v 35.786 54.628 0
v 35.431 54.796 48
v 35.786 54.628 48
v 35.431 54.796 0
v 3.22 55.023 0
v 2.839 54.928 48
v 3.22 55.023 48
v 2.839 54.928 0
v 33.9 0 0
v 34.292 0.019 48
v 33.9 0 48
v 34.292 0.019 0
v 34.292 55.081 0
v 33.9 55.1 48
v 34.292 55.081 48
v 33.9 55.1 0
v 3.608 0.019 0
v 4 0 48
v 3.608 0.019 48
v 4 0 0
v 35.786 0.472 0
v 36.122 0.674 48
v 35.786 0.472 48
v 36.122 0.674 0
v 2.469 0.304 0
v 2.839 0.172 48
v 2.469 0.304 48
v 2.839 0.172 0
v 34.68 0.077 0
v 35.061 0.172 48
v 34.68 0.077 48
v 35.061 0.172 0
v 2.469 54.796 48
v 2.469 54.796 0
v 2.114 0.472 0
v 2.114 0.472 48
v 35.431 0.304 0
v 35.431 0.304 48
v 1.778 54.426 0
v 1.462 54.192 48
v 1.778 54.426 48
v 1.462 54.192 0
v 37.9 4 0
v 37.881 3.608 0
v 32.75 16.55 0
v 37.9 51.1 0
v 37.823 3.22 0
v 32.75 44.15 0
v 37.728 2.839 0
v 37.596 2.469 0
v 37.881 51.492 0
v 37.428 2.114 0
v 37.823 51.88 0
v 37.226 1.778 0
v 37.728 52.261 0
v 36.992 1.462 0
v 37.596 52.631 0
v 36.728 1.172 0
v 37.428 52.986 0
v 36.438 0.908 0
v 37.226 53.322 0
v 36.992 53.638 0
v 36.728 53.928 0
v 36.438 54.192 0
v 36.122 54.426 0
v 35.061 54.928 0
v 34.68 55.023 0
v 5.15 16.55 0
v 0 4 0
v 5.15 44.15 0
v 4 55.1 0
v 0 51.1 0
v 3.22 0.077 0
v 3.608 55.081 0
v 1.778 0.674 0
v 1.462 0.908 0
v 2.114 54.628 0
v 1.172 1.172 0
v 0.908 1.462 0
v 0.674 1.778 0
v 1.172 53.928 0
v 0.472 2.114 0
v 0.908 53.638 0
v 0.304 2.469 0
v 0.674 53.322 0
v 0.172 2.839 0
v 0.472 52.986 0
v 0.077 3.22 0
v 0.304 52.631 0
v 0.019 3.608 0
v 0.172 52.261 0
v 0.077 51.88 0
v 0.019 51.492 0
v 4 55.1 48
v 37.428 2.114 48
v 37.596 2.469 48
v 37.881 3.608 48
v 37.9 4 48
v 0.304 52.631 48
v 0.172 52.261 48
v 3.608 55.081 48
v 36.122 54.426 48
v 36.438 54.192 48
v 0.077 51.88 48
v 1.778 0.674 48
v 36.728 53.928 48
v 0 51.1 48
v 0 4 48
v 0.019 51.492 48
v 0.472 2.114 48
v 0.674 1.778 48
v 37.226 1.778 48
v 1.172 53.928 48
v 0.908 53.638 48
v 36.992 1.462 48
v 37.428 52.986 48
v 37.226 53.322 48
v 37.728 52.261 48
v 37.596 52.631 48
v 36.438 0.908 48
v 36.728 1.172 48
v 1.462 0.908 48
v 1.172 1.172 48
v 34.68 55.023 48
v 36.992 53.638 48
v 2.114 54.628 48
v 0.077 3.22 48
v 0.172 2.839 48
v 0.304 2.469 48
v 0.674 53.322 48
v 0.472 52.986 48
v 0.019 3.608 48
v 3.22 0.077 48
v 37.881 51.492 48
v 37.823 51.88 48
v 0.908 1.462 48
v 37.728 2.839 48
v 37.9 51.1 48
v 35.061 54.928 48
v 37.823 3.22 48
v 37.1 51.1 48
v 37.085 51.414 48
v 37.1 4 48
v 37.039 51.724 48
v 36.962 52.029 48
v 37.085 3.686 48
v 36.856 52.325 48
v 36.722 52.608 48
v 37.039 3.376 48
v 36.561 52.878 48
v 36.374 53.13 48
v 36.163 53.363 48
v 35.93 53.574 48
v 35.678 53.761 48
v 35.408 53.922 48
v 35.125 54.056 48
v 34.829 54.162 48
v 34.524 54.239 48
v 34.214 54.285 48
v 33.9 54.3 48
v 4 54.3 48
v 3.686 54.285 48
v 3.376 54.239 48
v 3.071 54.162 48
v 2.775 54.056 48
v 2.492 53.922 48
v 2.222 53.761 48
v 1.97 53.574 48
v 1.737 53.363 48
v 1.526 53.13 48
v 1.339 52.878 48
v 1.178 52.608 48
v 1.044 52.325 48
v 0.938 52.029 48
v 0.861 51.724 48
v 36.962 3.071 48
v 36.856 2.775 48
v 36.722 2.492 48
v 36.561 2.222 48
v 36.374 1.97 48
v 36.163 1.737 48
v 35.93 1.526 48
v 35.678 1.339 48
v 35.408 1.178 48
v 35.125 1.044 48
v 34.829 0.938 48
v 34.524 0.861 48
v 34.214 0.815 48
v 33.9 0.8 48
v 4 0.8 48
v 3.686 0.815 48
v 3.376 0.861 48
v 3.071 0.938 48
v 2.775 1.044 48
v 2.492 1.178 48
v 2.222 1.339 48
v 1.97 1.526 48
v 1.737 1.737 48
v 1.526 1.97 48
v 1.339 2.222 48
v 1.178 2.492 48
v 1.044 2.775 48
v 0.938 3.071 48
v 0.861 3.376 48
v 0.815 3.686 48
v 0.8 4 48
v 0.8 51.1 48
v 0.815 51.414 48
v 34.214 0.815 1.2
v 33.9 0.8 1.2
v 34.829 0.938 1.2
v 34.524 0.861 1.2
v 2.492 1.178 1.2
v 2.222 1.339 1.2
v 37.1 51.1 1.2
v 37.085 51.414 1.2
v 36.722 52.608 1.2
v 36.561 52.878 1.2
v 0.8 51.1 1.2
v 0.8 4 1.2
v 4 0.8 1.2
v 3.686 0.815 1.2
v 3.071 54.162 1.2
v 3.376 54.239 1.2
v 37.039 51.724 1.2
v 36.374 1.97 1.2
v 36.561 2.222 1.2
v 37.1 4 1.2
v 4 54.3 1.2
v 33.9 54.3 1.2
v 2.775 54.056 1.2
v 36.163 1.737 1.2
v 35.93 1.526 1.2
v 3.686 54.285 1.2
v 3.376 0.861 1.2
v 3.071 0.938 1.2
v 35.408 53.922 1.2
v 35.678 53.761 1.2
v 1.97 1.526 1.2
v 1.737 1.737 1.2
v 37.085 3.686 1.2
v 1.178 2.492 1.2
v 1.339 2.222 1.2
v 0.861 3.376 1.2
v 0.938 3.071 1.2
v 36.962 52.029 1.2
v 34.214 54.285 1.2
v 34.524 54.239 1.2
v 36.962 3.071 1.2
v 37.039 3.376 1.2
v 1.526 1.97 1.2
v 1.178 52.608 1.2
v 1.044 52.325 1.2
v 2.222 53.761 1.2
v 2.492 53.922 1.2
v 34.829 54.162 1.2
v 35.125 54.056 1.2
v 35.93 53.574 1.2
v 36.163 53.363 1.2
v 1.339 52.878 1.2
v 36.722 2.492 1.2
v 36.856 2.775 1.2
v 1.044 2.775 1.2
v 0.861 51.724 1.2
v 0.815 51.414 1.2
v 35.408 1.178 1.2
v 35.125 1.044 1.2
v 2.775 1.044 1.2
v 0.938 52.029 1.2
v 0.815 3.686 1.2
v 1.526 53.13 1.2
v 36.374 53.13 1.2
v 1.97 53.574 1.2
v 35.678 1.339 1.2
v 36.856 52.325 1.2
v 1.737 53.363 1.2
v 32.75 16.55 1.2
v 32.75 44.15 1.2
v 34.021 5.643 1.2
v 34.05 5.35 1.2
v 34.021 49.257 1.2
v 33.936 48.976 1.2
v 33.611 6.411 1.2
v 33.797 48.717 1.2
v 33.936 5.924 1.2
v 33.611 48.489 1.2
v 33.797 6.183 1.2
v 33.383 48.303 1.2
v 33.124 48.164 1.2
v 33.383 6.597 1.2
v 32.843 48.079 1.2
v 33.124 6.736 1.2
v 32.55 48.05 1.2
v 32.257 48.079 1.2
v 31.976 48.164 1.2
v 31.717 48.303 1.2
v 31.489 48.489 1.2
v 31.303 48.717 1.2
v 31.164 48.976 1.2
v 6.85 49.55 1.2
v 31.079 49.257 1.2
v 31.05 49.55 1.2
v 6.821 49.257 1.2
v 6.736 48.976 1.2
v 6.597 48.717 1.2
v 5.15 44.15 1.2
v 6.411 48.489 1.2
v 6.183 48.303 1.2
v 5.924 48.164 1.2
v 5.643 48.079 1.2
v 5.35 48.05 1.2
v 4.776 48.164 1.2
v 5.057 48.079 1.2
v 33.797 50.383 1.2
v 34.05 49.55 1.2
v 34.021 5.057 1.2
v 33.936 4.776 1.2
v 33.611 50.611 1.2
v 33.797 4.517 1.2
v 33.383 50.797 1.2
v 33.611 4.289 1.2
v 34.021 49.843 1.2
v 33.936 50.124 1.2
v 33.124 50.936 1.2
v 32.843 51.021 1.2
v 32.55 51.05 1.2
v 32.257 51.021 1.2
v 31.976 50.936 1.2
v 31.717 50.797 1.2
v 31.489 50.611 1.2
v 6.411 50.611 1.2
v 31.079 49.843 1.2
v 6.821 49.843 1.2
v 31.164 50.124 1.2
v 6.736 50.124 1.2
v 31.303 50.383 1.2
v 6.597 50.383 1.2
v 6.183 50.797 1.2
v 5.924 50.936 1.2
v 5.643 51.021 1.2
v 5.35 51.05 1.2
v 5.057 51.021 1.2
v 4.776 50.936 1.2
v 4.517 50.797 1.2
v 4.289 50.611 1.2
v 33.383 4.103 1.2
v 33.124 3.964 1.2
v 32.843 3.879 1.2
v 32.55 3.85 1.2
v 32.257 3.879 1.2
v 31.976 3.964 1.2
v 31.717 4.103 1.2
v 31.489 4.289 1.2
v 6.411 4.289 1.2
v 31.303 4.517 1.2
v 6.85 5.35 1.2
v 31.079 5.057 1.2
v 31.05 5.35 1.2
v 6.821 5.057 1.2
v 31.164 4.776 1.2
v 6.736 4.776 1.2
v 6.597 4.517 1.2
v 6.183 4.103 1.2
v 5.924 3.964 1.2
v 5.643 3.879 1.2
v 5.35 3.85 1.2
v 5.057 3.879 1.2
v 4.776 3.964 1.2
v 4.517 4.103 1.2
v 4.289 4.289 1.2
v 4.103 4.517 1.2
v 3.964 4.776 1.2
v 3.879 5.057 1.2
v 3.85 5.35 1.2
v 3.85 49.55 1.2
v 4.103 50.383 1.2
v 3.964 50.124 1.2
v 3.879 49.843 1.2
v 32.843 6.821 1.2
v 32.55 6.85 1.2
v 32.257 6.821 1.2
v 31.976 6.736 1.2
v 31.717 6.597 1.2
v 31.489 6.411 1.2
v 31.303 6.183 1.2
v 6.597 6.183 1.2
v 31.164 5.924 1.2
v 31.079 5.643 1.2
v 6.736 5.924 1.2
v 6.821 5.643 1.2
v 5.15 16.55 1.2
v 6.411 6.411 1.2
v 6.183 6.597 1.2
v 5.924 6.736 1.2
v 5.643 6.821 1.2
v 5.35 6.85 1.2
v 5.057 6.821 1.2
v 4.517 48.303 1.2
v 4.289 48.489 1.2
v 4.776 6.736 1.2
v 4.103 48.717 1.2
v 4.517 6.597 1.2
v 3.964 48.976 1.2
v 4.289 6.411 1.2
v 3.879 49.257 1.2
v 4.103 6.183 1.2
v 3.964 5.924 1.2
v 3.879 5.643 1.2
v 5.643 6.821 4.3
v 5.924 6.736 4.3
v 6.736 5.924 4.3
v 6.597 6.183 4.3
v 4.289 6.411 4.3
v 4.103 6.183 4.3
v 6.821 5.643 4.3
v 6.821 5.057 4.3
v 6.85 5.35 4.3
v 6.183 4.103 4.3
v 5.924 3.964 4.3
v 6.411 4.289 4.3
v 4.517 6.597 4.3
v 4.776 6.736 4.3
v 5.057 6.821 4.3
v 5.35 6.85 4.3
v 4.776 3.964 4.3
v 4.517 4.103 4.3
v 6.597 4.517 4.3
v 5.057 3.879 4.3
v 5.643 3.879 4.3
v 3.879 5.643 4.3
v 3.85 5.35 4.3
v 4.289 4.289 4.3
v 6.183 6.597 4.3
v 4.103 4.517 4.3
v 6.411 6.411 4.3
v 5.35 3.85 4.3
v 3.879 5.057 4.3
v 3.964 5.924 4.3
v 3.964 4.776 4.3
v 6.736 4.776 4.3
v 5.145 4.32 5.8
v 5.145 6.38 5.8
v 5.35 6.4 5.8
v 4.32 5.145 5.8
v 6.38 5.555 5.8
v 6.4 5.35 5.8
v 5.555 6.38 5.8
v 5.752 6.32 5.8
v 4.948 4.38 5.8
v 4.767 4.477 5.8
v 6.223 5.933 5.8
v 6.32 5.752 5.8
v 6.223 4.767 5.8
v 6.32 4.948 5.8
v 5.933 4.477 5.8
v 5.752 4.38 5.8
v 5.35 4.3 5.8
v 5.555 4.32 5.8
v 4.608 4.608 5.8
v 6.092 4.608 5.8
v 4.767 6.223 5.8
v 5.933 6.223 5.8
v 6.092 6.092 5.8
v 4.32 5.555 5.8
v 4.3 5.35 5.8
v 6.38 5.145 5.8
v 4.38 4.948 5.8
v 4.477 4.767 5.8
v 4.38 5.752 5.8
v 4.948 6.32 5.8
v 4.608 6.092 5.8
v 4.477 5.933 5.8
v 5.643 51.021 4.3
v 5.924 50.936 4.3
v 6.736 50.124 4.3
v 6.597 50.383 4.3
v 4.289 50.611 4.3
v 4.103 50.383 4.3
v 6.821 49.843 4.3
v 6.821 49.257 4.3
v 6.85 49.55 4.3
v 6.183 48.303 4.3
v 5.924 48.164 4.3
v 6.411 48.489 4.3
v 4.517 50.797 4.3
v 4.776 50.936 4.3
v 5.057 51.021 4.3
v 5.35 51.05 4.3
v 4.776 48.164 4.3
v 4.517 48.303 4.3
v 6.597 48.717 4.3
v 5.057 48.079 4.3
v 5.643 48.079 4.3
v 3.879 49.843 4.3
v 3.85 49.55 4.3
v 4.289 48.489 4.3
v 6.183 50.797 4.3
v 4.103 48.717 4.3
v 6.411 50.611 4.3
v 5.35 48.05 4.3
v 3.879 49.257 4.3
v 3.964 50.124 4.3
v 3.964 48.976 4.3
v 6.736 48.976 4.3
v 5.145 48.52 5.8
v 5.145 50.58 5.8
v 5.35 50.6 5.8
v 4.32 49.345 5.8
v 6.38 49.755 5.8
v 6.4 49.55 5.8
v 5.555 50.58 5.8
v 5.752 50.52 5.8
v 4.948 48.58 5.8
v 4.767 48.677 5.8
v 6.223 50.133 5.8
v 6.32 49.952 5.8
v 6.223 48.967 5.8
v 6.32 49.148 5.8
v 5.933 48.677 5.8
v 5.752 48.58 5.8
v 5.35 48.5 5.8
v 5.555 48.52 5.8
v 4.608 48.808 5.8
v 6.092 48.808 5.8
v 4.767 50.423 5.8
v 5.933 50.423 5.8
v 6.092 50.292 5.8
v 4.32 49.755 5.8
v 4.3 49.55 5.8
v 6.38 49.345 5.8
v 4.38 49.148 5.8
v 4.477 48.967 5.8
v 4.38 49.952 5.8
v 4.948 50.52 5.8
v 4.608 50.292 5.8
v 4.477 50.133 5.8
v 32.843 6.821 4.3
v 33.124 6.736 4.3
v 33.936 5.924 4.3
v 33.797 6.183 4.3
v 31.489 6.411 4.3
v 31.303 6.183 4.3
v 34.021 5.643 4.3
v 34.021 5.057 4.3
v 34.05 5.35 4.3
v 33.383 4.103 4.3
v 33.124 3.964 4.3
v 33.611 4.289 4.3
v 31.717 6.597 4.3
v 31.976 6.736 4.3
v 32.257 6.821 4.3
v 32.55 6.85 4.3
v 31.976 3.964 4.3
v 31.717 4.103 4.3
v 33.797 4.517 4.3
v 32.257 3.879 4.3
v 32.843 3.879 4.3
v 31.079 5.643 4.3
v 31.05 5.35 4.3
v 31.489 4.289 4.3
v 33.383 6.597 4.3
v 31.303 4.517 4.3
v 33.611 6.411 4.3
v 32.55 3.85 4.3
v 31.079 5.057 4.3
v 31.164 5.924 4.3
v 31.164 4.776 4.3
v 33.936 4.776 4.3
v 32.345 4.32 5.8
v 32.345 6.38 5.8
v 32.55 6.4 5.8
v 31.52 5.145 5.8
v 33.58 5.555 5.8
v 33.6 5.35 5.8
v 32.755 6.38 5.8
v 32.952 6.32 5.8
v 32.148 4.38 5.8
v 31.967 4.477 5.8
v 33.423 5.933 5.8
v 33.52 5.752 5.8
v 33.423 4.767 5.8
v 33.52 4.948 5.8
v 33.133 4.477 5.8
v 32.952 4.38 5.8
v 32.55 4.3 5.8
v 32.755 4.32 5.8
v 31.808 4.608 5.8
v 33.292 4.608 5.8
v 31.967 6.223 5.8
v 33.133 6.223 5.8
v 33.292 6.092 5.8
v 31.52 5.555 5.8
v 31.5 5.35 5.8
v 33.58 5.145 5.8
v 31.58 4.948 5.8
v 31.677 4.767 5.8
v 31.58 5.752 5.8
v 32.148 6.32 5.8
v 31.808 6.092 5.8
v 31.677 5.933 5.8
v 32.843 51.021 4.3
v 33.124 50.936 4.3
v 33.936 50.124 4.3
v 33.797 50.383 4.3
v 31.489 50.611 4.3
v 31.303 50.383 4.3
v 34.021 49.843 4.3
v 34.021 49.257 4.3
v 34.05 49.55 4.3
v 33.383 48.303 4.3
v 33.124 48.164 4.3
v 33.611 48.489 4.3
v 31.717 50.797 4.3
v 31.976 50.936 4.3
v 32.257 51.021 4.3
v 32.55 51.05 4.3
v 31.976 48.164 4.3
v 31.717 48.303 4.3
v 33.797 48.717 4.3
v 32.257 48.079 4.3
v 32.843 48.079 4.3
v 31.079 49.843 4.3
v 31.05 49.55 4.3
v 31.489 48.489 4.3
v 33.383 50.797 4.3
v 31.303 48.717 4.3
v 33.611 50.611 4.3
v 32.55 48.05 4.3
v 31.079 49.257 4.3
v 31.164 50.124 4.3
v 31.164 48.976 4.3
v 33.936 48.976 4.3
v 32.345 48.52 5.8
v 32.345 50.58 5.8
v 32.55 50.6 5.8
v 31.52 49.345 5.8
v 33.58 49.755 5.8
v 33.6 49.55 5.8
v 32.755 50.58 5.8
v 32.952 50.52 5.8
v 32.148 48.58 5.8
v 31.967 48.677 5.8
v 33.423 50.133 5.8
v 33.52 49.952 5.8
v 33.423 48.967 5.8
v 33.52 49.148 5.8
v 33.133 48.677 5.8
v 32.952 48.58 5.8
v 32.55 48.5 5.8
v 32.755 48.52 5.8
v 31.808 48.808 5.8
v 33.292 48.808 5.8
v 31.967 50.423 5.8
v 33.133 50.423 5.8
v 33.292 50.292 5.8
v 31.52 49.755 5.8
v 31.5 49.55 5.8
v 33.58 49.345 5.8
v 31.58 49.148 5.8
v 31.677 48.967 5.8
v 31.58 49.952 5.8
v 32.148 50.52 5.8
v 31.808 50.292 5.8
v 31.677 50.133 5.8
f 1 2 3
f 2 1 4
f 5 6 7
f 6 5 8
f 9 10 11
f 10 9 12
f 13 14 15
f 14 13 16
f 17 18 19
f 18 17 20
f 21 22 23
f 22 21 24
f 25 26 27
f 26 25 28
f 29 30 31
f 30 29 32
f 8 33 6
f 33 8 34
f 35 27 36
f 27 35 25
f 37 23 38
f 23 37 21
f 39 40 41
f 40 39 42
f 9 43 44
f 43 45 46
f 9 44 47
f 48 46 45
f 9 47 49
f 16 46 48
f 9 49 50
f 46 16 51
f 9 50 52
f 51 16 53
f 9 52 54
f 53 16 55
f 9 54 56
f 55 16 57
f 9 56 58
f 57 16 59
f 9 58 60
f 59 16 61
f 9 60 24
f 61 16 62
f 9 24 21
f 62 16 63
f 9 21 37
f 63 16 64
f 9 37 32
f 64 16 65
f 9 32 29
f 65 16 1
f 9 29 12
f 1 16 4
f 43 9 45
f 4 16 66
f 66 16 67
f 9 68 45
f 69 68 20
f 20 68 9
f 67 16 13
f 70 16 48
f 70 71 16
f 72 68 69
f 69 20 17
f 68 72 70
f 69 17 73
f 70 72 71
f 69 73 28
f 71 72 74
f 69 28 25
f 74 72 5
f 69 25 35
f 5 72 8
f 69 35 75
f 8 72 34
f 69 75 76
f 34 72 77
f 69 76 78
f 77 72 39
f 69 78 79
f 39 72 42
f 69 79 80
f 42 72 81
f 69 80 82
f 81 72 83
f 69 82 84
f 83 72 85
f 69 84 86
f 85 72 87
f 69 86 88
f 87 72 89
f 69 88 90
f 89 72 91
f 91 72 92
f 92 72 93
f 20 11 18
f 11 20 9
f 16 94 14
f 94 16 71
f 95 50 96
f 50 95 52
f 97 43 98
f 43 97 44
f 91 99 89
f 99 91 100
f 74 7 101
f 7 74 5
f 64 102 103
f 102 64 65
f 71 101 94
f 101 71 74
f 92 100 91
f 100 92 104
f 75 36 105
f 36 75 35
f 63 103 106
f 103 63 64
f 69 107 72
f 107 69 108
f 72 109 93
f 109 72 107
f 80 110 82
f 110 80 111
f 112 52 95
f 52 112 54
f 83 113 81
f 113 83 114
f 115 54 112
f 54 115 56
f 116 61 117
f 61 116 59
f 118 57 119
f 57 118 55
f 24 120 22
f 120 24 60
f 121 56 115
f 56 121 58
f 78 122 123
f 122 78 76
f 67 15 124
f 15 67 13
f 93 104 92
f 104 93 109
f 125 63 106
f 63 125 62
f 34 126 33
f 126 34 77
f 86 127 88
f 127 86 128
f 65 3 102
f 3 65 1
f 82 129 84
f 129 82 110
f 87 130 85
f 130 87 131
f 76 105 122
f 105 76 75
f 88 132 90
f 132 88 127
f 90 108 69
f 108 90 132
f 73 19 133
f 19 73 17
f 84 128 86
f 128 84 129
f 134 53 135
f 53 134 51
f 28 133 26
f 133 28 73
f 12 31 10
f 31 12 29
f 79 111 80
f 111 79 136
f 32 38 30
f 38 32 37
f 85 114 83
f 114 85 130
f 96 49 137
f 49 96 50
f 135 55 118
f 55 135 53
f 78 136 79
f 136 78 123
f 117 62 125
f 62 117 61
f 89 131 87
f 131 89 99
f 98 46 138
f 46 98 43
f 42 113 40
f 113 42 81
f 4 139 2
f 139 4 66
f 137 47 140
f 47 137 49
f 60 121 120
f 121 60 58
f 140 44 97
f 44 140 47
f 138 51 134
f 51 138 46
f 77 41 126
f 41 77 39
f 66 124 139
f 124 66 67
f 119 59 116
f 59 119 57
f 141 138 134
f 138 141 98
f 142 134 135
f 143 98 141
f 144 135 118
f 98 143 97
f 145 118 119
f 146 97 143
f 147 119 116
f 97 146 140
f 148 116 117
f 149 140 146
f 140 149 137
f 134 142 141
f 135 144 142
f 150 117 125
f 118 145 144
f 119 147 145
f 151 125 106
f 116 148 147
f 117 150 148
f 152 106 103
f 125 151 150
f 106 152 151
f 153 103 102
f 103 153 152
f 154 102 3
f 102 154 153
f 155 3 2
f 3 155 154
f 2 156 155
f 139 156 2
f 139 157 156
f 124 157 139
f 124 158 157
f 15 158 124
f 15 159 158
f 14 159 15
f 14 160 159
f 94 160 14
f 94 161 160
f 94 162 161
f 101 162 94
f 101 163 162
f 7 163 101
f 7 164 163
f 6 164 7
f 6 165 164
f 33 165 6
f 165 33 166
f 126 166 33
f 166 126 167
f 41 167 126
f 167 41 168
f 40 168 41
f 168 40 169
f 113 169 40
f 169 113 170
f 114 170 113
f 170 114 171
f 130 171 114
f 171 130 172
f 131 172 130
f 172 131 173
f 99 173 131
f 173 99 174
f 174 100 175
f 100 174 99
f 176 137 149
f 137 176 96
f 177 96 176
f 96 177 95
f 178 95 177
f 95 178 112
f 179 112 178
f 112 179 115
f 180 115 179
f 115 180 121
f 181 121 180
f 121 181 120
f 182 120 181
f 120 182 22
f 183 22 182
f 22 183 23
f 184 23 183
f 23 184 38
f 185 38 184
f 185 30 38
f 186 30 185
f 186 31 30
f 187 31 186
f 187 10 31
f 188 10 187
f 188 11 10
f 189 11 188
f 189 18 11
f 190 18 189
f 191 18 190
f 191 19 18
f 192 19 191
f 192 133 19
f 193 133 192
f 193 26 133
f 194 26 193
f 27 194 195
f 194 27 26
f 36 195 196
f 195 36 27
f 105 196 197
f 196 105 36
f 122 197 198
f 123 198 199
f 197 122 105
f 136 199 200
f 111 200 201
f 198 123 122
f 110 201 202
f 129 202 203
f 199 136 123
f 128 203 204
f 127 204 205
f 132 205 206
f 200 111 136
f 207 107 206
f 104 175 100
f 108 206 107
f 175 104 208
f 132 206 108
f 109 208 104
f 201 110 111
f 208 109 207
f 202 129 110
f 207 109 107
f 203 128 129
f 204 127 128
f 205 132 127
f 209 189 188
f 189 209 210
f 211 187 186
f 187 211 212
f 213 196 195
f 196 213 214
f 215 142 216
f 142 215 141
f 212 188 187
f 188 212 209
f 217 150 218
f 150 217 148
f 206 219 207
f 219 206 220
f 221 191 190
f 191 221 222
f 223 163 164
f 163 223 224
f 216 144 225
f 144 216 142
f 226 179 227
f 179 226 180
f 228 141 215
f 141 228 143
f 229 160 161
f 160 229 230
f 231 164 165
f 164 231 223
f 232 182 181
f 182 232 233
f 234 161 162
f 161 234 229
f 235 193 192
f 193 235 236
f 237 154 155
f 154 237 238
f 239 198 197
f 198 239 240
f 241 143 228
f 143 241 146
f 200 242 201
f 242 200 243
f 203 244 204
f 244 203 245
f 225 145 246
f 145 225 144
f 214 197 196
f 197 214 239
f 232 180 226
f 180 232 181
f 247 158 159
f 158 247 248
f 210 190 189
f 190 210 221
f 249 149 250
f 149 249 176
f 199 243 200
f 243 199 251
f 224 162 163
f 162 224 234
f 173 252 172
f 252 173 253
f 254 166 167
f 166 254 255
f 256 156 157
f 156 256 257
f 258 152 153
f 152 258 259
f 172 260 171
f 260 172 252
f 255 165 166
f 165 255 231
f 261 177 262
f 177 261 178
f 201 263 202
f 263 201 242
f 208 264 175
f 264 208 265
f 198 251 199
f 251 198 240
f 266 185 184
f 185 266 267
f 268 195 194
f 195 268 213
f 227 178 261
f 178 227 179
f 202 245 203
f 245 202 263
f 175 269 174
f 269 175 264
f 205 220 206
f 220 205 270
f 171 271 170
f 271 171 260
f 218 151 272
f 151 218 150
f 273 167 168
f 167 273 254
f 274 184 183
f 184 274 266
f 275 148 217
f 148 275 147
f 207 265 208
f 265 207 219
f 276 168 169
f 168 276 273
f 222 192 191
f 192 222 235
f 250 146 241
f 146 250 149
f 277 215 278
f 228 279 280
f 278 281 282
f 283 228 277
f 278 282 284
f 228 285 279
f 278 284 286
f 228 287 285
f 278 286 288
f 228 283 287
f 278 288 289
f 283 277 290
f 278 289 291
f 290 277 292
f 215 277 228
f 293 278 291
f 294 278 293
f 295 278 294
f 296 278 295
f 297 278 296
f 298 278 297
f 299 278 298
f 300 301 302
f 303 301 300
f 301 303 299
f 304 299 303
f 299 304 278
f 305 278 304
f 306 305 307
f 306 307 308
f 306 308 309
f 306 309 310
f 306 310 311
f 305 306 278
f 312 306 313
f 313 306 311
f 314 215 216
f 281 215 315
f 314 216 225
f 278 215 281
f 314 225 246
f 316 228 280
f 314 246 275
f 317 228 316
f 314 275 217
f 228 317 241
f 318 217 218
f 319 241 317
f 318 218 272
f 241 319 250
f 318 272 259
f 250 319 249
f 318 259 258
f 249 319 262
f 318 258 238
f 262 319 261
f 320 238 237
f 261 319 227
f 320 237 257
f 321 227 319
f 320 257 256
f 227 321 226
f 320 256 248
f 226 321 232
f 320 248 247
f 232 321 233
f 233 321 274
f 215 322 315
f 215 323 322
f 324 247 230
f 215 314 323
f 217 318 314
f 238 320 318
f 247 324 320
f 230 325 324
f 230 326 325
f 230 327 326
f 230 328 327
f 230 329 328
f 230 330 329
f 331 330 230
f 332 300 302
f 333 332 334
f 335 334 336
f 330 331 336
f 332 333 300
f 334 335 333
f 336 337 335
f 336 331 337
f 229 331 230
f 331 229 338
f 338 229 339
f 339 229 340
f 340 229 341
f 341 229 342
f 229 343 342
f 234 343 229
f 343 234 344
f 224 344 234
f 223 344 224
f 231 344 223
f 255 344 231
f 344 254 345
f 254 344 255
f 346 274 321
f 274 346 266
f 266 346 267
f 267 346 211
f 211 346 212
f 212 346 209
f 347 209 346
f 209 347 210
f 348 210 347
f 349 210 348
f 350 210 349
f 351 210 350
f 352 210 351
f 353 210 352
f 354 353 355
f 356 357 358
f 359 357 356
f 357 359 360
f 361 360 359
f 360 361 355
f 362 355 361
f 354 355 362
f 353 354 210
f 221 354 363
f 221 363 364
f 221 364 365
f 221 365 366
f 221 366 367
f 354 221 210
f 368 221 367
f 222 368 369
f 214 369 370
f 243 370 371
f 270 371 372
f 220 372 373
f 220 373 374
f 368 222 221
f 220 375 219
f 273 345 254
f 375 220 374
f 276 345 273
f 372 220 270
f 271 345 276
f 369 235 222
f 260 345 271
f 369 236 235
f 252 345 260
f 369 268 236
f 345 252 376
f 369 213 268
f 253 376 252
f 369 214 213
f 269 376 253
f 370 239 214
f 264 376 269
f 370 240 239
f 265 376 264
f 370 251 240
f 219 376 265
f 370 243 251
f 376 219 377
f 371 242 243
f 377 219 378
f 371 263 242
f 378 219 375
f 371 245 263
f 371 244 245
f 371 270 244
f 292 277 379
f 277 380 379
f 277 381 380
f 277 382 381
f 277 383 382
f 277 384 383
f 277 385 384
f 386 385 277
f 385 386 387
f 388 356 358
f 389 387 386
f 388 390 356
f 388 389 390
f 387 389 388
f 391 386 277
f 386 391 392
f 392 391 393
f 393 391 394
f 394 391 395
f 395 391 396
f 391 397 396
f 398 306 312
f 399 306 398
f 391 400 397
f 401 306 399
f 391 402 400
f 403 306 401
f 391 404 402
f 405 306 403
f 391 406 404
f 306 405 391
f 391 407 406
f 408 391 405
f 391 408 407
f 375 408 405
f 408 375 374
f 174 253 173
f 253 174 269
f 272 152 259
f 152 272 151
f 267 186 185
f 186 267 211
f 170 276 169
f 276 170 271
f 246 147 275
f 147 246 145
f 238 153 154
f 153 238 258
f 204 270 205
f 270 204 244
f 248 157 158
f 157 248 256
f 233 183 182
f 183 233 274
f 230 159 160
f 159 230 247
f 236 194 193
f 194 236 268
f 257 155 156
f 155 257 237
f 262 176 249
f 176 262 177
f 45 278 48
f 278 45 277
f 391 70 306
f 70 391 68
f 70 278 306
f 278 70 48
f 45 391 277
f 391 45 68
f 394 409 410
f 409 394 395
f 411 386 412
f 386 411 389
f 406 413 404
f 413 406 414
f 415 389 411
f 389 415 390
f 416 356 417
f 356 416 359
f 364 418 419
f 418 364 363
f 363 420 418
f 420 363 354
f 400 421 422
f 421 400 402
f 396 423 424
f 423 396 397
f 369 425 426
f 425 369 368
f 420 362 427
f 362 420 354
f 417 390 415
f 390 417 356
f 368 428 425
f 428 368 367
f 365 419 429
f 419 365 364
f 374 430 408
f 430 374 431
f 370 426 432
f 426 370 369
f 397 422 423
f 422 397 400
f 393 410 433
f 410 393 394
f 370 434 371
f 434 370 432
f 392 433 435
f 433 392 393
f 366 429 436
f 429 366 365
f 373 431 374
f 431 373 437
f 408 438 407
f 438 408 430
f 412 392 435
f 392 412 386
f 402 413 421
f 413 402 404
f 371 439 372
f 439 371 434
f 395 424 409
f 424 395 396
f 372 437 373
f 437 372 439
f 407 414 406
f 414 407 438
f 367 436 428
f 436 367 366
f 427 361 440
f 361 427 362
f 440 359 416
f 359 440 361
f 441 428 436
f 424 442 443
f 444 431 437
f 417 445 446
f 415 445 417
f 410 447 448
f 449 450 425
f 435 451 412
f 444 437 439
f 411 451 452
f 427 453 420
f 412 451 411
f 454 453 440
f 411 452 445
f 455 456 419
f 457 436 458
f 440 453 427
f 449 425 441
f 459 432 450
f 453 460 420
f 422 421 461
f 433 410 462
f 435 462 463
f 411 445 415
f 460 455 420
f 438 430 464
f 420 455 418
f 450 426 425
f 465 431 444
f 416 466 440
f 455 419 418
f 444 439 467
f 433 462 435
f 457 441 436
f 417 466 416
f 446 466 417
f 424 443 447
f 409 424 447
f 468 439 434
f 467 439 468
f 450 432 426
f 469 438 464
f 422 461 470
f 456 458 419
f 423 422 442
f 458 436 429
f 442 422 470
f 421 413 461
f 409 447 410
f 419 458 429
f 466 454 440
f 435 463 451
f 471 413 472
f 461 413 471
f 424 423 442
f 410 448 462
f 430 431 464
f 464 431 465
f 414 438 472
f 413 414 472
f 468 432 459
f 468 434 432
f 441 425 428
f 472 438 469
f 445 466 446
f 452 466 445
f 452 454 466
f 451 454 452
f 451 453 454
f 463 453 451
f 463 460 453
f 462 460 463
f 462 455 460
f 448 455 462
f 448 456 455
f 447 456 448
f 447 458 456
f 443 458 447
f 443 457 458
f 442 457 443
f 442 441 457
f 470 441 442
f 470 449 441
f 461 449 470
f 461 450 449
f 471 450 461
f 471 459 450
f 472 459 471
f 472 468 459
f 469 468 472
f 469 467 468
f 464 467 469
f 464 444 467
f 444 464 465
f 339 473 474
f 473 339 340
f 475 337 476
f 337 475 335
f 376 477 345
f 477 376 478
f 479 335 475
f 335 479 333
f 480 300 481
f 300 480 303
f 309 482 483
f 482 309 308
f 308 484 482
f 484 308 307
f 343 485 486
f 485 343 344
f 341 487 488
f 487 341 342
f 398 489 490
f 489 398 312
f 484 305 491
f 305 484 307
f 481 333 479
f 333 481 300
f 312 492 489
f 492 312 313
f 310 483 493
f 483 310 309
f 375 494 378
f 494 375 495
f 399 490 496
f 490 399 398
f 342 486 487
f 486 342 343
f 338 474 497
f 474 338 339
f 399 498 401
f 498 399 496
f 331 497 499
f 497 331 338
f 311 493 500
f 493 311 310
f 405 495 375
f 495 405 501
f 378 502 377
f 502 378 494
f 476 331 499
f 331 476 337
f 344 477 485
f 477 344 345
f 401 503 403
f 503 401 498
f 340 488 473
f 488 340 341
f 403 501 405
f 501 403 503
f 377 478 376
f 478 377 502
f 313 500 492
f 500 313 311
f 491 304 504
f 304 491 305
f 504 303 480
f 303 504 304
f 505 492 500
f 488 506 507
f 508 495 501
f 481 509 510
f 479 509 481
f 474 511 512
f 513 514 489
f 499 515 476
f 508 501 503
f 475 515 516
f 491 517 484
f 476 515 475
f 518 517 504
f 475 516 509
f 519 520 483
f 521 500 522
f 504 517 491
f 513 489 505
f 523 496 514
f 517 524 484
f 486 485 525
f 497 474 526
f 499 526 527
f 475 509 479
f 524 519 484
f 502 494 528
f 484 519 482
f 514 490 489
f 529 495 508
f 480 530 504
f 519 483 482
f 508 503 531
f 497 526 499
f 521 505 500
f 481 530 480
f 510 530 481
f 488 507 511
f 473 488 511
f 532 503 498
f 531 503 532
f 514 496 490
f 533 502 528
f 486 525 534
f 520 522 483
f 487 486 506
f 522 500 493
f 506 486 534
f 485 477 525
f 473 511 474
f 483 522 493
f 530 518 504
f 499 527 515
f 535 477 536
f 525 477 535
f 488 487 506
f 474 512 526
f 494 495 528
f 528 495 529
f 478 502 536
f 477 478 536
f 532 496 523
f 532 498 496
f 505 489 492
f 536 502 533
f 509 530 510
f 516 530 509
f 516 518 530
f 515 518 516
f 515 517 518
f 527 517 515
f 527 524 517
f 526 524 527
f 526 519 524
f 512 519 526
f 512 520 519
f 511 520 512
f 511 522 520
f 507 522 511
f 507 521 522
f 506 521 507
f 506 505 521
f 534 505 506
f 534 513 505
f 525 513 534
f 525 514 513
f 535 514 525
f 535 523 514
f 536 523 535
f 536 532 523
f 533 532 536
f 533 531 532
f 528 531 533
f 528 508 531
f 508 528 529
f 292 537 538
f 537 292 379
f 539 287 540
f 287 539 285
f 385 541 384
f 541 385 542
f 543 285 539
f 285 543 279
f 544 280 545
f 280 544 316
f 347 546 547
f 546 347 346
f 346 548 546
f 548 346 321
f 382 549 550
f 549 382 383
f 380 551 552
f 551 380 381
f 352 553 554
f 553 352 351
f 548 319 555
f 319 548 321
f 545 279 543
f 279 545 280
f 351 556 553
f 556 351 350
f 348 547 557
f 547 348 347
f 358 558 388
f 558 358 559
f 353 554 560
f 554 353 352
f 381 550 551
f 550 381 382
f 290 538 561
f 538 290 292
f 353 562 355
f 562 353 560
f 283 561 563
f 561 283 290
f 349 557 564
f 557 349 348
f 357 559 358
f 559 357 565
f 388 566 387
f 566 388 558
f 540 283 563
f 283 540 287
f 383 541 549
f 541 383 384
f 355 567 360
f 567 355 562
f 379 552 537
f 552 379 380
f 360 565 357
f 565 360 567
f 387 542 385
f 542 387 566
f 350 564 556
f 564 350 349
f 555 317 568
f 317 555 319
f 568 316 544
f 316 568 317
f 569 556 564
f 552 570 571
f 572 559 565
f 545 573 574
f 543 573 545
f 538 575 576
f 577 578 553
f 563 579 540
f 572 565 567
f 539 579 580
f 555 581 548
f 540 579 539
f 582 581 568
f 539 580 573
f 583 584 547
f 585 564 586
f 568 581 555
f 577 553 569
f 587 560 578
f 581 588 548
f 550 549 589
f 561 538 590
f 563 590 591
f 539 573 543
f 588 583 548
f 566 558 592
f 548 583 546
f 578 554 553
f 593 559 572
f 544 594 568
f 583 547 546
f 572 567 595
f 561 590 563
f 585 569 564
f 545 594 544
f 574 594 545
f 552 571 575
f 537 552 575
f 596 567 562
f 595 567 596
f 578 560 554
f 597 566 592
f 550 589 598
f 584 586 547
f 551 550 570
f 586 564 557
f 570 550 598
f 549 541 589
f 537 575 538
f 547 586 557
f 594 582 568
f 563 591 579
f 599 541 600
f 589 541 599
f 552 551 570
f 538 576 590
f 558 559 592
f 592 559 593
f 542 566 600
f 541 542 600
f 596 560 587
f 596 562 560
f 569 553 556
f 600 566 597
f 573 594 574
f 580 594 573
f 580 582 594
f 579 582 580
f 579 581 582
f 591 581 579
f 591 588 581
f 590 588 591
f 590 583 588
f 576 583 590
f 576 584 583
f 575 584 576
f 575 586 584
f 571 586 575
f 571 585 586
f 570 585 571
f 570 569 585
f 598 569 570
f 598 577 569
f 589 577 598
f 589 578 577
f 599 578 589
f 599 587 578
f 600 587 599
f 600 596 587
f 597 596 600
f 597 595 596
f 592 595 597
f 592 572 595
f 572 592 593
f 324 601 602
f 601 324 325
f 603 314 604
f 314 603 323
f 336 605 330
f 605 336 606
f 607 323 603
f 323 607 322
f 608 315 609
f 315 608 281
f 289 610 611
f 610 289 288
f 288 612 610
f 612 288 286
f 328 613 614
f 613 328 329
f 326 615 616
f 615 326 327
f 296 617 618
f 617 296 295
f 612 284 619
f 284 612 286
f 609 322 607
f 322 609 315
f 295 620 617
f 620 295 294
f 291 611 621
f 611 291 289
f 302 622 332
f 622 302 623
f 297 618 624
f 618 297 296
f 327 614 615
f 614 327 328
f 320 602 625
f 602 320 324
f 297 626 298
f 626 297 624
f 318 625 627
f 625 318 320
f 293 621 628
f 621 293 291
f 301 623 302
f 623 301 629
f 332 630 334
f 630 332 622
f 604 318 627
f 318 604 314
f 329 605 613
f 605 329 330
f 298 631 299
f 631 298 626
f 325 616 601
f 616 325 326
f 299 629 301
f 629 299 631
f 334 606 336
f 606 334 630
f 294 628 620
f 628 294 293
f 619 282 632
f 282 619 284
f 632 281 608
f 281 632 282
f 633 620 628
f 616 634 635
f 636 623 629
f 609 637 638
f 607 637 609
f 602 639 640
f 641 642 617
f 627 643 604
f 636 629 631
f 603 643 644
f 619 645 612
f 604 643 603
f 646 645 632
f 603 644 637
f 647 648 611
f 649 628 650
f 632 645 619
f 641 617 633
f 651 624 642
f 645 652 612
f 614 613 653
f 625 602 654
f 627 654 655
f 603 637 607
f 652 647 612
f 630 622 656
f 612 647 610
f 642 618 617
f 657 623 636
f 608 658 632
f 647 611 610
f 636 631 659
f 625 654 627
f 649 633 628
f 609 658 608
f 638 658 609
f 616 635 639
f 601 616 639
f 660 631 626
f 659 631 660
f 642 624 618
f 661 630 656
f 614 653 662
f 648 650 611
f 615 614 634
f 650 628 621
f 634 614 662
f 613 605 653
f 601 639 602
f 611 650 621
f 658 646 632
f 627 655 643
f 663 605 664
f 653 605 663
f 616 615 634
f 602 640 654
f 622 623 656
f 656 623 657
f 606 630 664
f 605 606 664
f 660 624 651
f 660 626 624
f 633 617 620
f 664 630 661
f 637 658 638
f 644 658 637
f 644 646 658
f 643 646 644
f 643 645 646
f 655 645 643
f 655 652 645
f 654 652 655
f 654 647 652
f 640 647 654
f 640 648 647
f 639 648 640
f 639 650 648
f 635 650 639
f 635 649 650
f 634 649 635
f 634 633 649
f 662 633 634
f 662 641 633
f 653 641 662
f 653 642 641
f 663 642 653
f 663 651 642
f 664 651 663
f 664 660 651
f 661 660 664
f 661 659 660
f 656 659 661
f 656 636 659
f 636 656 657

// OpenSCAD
display_x = 32.8;
display_y = 50;
nozzle = 0.4;
wall = nozzle * 2;
print_margin = 0.15;
extra_space = 2;
outer_x = display_x + wall + print_margin * 2 + extra_space * 2;
outer_y = display_y + wall + print_margin * 2 + extra_space * 2;
inner_x = outer_x - 2 * wall;
inner_y = outer_y - 2 * wall;
outer_height_z = 48;
display_window = 27.6;
epsilon = 0.01;
window_y_offset = 2.8;
pin_diameter = 3;
pin_height = 5;
pin_y_top_offset = 5.4;
pin_y_bottom_offset = 11.2;
pin_corner_offset = 0.2;
pin_facets = 32;
make_flat = false;

corner_r = 4;
shell_fn = 64;
front_dome_r = 180;

module rounded_footprint(x, y, r) {
    offset(r = r, $fn = shell_fn)
        offset(r = -r)
            square([x, y]);
}

module outer_shell() {
    dome_z_offset = front_dome_r - sqrt(front_dome_r * front_dome_r - pow(min(outer_x, outer_y) / 2, 2));
    intersection() {
        translate([0, 0, -dome_z_offset])
            sphere(r = front_dome_r + outer_height_z, $fn = shell_fn * 2);
        linear_extrude(height = outer_height_z + dome_z_offset + 1)
            rounded_footprint(outer_x, outer_y, corner_r);
        cube([outer_x, outer_y, outer_height_z]);
    }
}

module inner_cavity() {
    translate([wall, wall, wall + nozzle])
        linear_extrude(height = outer_height_z)
            rounded_footprint(inner_x, inner_y, corner_r - wall);
}

module eink_window() {
    translate([
        (outer_x - display_window) / 2,
        ((outer_y - display_window) / 2) + window_y_offset,
        -epsilon
    ])
        cube([
            display_window,
            display_window,
            wall + 2 * epsilon + 0.5
        ]);
}

module chamfered_pin(d, h) {
    chamfer_height = h * 0.3;
    base_height = h - chamfer_height;
    cylinder(h = base_height, d = d, $fn = pin_facets);
    translate([0, 0, base_height])
        cylinder(h = chamfer_height, d1 = d, d2 = d * 0.7, $fn = pin_facets);
}

module pins() {
    window_x_left = (outer_x - display_window) / 2;
    window_x_right = (outer_x + display_window) / 2;
    window_y_bot = ((outer_y - display_window) / 2) + window_y_offset;
    window_y_top = ((outer_y + display_window) / 2) + window_y_offset;
    pin_x_left = window_x_left + pin_corner_offset;
    pin_x_right = window_x_right - pin_corner_offset;
    for (px = [pin_x_left, pin_x_right]) {
        translate([px, window_y_bot - pin_y_bottom_offset, wall])
            chamfered_pin(pin_diameter, pin_height);
        translate([px, window_y_top + pin_y_top_offset, wall])
            chamfered_pin(pin_diameter, pin_height);
    }
}

module conditional_projection(apply) {
    if (apply) {
        projection(cut = true) translate([0, 0, -1]) children();
    } else {
        children();
    }
}

conditional_projection(make_flat) {
    union() {
        difference() {
            outer_shell();
            inner_cavity();
            eink_window();
        }
        pins();
    }
}
